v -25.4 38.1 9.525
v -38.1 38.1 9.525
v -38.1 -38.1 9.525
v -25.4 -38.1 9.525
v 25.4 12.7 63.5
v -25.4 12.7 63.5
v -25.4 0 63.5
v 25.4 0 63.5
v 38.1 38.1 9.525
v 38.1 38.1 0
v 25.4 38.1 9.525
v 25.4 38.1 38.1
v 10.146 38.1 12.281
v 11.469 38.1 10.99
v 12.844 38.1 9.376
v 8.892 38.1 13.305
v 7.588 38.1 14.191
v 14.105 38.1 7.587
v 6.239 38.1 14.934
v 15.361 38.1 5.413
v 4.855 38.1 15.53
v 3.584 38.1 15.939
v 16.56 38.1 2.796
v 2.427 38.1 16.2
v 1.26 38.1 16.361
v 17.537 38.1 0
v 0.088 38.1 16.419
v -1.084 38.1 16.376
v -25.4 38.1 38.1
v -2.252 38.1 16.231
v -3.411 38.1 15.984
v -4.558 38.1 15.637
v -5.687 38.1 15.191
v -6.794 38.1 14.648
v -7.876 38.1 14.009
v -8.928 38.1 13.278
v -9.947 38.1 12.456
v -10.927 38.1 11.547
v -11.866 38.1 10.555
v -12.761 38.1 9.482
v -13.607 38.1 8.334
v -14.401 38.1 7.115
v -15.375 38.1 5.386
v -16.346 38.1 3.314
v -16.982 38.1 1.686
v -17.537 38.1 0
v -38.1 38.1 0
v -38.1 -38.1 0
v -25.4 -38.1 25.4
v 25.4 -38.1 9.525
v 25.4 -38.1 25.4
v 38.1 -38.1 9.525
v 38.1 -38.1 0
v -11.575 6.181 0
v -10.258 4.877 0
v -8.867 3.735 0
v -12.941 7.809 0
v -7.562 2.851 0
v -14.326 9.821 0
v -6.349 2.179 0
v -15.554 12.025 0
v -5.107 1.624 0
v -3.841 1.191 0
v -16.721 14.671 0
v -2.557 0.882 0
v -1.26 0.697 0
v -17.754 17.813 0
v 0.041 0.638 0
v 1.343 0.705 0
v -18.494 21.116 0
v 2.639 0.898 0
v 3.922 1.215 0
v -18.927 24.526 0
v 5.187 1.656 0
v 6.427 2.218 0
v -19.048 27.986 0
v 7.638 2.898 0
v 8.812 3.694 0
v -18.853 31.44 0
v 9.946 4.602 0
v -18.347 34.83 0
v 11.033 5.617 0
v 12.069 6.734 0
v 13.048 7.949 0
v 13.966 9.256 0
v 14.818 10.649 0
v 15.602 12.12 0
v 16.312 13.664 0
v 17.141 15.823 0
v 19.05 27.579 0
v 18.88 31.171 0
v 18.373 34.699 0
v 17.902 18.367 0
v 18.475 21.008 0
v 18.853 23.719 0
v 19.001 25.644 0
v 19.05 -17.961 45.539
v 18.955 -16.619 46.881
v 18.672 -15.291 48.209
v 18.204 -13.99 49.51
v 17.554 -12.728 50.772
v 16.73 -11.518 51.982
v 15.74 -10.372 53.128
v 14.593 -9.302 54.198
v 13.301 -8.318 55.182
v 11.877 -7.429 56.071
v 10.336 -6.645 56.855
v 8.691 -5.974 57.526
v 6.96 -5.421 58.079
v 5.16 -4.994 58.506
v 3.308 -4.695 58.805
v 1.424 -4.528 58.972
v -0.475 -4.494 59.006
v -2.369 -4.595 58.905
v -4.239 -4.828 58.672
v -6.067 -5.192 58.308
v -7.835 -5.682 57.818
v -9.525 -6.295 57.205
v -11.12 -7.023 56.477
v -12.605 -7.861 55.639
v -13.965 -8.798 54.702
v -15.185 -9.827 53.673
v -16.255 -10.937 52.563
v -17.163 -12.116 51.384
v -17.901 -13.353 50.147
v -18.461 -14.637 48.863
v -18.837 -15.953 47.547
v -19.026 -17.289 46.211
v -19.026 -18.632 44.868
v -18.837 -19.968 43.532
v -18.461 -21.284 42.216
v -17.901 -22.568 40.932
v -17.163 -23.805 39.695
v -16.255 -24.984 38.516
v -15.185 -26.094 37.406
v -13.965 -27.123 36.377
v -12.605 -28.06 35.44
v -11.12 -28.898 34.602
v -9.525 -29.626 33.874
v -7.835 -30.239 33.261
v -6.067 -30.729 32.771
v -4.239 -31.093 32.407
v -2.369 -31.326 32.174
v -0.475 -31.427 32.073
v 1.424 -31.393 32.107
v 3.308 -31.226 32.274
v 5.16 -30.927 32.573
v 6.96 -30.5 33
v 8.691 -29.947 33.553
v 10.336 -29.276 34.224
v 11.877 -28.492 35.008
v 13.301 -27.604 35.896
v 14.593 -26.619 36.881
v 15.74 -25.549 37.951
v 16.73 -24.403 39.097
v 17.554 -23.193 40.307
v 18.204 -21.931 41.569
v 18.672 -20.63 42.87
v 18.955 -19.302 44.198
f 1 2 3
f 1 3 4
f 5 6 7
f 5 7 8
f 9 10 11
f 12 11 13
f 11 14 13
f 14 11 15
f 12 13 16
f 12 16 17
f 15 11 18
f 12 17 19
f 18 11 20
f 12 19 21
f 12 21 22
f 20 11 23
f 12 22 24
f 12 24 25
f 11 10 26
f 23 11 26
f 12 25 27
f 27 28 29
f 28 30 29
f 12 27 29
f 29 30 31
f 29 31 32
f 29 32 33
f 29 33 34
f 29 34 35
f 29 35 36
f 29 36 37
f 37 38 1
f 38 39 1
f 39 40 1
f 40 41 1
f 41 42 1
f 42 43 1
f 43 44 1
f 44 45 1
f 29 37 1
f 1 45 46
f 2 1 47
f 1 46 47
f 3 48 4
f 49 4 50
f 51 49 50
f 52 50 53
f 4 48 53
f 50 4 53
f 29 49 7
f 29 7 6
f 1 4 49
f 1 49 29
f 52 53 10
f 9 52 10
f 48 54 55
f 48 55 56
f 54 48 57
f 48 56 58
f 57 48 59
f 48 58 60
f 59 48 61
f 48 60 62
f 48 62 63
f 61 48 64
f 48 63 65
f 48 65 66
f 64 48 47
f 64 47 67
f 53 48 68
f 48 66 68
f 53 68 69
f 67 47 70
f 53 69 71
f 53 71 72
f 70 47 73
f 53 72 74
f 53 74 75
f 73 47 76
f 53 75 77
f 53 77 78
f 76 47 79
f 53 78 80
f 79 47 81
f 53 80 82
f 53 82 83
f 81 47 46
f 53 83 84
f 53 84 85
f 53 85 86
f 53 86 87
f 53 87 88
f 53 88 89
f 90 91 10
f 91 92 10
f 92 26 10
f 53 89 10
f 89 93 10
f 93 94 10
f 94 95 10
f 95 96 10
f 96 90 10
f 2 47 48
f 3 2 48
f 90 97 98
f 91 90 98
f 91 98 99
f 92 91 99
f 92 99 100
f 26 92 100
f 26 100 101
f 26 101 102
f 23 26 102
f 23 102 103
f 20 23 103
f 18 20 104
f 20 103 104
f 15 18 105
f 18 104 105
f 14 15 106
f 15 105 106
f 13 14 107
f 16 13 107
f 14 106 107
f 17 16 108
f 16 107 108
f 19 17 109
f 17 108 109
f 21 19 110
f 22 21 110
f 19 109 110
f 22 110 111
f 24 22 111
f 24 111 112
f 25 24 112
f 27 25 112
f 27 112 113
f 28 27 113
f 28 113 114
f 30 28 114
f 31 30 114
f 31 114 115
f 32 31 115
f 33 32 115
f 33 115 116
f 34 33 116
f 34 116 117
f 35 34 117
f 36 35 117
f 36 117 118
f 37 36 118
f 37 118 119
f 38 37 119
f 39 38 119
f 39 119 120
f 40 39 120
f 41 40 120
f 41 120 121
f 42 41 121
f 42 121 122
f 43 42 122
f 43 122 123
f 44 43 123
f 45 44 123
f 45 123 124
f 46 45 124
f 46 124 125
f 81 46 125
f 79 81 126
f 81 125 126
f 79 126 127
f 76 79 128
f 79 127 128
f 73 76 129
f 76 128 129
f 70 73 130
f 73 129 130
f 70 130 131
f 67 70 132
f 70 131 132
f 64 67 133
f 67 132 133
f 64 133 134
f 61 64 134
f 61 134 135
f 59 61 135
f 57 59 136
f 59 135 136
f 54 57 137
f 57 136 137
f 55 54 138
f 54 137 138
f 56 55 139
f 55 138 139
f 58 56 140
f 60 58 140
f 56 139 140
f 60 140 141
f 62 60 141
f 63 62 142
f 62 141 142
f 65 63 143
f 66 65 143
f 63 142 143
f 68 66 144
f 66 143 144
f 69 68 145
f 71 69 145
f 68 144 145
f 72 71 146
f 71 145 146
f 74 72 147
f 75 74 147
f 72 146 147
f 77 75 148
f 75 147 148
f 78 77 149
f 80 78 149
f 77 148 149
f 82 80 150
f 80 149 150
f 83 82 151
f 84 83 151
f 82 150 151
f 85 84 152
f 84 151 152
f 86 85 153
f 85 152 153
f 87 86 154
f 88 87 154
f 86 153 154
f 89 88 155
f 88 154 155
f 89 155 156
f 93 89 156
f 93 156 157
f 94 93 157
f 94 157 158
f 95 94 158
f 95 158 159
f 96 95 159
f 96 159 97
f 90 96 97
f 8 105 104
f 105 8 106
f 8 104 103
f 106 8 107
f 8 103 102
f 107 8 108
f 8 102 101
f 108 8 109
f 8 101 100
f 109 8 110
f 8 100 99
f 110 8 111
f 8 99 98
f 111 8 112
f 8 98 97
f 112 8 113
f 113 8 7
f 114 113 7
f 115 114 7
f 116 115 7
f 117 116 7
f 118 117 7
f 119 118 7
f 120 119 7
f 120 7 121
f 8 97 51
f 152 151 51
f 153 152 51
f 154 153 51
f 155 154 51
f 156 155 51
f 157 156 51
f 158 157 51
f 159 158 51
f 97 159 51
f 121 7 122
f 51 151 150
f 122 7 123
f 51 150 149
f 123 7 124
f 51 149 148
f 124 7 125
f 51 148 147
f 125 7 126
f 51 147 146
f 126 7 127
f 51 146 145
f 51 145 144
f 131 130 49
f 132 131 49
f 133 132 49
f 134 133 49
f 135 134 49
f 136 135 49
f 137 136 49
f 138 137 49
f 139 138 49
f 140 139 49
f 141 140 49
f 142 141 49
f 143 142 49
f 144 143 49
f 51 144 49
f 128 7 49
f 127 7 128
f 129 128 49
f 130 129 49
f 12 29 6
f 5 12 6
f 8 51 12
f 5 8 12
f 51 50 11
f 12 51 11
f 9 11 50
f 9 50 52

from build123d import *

# Parameters (mm, degrees)
F1_DEPTH = 9.525
F2_W     = 50.8
F2_H     = 76.2
F3_DEPTH = 53.975
F5_DEPTH = 50.8
F6_R     = 19.05
F7_DEPTH = 76.2


with BuildPart() as f1:
    # F0 (on Top) → F1 (new body)
    with BuildSketch(Plane.XY):
        Polygon((0, 38.1), (-38.1, 38.1), (-38.1, 0), (-38.1, -38.1), (0, -38.1), (38.1, -38.1), (38.1, 0), (38.1, 38.1), align=None)
    extrude(amount=F1_DEPTH)

    # F2 (on face) → F3 (join)
    with BuildSketch(Plane.XY.offset(9.525)):
        Rectangle(F2_W, F2_H)
    extrude(amount=F3_DEPTH)

    # F4 (on face) → F5 (cut)
    with BuildSketch(Plane(origin=(-25.4, 0, 0), x_dir=(0, -1, 0), z_dir=(-1, 0, 0))):
        Polygon((-38.1, 63.5), (-38.1, 38.1), (-12.7, 63.5), align=None)
        Polygon((38.1, 63.5), (0, 63.5), (38.1, 25.4), align=None)
    extrude(amount=-F5_DEPTH, mode=Mode.SUBTRACT)

    # F6 (on face) → F7 (cut)
    with BuildSketch(Plane(origin=(0, -31.75, 31.75), x_dir=(1, 0, 0), z_dir=(0, -0.707107, 0.707107))):
        with Locations((0, 19.501281)):
            Circle(F6_R)
    extrude(amount=-F7_DEPTH, mode=Mode.SUBTRACT)


solid = f1.part
